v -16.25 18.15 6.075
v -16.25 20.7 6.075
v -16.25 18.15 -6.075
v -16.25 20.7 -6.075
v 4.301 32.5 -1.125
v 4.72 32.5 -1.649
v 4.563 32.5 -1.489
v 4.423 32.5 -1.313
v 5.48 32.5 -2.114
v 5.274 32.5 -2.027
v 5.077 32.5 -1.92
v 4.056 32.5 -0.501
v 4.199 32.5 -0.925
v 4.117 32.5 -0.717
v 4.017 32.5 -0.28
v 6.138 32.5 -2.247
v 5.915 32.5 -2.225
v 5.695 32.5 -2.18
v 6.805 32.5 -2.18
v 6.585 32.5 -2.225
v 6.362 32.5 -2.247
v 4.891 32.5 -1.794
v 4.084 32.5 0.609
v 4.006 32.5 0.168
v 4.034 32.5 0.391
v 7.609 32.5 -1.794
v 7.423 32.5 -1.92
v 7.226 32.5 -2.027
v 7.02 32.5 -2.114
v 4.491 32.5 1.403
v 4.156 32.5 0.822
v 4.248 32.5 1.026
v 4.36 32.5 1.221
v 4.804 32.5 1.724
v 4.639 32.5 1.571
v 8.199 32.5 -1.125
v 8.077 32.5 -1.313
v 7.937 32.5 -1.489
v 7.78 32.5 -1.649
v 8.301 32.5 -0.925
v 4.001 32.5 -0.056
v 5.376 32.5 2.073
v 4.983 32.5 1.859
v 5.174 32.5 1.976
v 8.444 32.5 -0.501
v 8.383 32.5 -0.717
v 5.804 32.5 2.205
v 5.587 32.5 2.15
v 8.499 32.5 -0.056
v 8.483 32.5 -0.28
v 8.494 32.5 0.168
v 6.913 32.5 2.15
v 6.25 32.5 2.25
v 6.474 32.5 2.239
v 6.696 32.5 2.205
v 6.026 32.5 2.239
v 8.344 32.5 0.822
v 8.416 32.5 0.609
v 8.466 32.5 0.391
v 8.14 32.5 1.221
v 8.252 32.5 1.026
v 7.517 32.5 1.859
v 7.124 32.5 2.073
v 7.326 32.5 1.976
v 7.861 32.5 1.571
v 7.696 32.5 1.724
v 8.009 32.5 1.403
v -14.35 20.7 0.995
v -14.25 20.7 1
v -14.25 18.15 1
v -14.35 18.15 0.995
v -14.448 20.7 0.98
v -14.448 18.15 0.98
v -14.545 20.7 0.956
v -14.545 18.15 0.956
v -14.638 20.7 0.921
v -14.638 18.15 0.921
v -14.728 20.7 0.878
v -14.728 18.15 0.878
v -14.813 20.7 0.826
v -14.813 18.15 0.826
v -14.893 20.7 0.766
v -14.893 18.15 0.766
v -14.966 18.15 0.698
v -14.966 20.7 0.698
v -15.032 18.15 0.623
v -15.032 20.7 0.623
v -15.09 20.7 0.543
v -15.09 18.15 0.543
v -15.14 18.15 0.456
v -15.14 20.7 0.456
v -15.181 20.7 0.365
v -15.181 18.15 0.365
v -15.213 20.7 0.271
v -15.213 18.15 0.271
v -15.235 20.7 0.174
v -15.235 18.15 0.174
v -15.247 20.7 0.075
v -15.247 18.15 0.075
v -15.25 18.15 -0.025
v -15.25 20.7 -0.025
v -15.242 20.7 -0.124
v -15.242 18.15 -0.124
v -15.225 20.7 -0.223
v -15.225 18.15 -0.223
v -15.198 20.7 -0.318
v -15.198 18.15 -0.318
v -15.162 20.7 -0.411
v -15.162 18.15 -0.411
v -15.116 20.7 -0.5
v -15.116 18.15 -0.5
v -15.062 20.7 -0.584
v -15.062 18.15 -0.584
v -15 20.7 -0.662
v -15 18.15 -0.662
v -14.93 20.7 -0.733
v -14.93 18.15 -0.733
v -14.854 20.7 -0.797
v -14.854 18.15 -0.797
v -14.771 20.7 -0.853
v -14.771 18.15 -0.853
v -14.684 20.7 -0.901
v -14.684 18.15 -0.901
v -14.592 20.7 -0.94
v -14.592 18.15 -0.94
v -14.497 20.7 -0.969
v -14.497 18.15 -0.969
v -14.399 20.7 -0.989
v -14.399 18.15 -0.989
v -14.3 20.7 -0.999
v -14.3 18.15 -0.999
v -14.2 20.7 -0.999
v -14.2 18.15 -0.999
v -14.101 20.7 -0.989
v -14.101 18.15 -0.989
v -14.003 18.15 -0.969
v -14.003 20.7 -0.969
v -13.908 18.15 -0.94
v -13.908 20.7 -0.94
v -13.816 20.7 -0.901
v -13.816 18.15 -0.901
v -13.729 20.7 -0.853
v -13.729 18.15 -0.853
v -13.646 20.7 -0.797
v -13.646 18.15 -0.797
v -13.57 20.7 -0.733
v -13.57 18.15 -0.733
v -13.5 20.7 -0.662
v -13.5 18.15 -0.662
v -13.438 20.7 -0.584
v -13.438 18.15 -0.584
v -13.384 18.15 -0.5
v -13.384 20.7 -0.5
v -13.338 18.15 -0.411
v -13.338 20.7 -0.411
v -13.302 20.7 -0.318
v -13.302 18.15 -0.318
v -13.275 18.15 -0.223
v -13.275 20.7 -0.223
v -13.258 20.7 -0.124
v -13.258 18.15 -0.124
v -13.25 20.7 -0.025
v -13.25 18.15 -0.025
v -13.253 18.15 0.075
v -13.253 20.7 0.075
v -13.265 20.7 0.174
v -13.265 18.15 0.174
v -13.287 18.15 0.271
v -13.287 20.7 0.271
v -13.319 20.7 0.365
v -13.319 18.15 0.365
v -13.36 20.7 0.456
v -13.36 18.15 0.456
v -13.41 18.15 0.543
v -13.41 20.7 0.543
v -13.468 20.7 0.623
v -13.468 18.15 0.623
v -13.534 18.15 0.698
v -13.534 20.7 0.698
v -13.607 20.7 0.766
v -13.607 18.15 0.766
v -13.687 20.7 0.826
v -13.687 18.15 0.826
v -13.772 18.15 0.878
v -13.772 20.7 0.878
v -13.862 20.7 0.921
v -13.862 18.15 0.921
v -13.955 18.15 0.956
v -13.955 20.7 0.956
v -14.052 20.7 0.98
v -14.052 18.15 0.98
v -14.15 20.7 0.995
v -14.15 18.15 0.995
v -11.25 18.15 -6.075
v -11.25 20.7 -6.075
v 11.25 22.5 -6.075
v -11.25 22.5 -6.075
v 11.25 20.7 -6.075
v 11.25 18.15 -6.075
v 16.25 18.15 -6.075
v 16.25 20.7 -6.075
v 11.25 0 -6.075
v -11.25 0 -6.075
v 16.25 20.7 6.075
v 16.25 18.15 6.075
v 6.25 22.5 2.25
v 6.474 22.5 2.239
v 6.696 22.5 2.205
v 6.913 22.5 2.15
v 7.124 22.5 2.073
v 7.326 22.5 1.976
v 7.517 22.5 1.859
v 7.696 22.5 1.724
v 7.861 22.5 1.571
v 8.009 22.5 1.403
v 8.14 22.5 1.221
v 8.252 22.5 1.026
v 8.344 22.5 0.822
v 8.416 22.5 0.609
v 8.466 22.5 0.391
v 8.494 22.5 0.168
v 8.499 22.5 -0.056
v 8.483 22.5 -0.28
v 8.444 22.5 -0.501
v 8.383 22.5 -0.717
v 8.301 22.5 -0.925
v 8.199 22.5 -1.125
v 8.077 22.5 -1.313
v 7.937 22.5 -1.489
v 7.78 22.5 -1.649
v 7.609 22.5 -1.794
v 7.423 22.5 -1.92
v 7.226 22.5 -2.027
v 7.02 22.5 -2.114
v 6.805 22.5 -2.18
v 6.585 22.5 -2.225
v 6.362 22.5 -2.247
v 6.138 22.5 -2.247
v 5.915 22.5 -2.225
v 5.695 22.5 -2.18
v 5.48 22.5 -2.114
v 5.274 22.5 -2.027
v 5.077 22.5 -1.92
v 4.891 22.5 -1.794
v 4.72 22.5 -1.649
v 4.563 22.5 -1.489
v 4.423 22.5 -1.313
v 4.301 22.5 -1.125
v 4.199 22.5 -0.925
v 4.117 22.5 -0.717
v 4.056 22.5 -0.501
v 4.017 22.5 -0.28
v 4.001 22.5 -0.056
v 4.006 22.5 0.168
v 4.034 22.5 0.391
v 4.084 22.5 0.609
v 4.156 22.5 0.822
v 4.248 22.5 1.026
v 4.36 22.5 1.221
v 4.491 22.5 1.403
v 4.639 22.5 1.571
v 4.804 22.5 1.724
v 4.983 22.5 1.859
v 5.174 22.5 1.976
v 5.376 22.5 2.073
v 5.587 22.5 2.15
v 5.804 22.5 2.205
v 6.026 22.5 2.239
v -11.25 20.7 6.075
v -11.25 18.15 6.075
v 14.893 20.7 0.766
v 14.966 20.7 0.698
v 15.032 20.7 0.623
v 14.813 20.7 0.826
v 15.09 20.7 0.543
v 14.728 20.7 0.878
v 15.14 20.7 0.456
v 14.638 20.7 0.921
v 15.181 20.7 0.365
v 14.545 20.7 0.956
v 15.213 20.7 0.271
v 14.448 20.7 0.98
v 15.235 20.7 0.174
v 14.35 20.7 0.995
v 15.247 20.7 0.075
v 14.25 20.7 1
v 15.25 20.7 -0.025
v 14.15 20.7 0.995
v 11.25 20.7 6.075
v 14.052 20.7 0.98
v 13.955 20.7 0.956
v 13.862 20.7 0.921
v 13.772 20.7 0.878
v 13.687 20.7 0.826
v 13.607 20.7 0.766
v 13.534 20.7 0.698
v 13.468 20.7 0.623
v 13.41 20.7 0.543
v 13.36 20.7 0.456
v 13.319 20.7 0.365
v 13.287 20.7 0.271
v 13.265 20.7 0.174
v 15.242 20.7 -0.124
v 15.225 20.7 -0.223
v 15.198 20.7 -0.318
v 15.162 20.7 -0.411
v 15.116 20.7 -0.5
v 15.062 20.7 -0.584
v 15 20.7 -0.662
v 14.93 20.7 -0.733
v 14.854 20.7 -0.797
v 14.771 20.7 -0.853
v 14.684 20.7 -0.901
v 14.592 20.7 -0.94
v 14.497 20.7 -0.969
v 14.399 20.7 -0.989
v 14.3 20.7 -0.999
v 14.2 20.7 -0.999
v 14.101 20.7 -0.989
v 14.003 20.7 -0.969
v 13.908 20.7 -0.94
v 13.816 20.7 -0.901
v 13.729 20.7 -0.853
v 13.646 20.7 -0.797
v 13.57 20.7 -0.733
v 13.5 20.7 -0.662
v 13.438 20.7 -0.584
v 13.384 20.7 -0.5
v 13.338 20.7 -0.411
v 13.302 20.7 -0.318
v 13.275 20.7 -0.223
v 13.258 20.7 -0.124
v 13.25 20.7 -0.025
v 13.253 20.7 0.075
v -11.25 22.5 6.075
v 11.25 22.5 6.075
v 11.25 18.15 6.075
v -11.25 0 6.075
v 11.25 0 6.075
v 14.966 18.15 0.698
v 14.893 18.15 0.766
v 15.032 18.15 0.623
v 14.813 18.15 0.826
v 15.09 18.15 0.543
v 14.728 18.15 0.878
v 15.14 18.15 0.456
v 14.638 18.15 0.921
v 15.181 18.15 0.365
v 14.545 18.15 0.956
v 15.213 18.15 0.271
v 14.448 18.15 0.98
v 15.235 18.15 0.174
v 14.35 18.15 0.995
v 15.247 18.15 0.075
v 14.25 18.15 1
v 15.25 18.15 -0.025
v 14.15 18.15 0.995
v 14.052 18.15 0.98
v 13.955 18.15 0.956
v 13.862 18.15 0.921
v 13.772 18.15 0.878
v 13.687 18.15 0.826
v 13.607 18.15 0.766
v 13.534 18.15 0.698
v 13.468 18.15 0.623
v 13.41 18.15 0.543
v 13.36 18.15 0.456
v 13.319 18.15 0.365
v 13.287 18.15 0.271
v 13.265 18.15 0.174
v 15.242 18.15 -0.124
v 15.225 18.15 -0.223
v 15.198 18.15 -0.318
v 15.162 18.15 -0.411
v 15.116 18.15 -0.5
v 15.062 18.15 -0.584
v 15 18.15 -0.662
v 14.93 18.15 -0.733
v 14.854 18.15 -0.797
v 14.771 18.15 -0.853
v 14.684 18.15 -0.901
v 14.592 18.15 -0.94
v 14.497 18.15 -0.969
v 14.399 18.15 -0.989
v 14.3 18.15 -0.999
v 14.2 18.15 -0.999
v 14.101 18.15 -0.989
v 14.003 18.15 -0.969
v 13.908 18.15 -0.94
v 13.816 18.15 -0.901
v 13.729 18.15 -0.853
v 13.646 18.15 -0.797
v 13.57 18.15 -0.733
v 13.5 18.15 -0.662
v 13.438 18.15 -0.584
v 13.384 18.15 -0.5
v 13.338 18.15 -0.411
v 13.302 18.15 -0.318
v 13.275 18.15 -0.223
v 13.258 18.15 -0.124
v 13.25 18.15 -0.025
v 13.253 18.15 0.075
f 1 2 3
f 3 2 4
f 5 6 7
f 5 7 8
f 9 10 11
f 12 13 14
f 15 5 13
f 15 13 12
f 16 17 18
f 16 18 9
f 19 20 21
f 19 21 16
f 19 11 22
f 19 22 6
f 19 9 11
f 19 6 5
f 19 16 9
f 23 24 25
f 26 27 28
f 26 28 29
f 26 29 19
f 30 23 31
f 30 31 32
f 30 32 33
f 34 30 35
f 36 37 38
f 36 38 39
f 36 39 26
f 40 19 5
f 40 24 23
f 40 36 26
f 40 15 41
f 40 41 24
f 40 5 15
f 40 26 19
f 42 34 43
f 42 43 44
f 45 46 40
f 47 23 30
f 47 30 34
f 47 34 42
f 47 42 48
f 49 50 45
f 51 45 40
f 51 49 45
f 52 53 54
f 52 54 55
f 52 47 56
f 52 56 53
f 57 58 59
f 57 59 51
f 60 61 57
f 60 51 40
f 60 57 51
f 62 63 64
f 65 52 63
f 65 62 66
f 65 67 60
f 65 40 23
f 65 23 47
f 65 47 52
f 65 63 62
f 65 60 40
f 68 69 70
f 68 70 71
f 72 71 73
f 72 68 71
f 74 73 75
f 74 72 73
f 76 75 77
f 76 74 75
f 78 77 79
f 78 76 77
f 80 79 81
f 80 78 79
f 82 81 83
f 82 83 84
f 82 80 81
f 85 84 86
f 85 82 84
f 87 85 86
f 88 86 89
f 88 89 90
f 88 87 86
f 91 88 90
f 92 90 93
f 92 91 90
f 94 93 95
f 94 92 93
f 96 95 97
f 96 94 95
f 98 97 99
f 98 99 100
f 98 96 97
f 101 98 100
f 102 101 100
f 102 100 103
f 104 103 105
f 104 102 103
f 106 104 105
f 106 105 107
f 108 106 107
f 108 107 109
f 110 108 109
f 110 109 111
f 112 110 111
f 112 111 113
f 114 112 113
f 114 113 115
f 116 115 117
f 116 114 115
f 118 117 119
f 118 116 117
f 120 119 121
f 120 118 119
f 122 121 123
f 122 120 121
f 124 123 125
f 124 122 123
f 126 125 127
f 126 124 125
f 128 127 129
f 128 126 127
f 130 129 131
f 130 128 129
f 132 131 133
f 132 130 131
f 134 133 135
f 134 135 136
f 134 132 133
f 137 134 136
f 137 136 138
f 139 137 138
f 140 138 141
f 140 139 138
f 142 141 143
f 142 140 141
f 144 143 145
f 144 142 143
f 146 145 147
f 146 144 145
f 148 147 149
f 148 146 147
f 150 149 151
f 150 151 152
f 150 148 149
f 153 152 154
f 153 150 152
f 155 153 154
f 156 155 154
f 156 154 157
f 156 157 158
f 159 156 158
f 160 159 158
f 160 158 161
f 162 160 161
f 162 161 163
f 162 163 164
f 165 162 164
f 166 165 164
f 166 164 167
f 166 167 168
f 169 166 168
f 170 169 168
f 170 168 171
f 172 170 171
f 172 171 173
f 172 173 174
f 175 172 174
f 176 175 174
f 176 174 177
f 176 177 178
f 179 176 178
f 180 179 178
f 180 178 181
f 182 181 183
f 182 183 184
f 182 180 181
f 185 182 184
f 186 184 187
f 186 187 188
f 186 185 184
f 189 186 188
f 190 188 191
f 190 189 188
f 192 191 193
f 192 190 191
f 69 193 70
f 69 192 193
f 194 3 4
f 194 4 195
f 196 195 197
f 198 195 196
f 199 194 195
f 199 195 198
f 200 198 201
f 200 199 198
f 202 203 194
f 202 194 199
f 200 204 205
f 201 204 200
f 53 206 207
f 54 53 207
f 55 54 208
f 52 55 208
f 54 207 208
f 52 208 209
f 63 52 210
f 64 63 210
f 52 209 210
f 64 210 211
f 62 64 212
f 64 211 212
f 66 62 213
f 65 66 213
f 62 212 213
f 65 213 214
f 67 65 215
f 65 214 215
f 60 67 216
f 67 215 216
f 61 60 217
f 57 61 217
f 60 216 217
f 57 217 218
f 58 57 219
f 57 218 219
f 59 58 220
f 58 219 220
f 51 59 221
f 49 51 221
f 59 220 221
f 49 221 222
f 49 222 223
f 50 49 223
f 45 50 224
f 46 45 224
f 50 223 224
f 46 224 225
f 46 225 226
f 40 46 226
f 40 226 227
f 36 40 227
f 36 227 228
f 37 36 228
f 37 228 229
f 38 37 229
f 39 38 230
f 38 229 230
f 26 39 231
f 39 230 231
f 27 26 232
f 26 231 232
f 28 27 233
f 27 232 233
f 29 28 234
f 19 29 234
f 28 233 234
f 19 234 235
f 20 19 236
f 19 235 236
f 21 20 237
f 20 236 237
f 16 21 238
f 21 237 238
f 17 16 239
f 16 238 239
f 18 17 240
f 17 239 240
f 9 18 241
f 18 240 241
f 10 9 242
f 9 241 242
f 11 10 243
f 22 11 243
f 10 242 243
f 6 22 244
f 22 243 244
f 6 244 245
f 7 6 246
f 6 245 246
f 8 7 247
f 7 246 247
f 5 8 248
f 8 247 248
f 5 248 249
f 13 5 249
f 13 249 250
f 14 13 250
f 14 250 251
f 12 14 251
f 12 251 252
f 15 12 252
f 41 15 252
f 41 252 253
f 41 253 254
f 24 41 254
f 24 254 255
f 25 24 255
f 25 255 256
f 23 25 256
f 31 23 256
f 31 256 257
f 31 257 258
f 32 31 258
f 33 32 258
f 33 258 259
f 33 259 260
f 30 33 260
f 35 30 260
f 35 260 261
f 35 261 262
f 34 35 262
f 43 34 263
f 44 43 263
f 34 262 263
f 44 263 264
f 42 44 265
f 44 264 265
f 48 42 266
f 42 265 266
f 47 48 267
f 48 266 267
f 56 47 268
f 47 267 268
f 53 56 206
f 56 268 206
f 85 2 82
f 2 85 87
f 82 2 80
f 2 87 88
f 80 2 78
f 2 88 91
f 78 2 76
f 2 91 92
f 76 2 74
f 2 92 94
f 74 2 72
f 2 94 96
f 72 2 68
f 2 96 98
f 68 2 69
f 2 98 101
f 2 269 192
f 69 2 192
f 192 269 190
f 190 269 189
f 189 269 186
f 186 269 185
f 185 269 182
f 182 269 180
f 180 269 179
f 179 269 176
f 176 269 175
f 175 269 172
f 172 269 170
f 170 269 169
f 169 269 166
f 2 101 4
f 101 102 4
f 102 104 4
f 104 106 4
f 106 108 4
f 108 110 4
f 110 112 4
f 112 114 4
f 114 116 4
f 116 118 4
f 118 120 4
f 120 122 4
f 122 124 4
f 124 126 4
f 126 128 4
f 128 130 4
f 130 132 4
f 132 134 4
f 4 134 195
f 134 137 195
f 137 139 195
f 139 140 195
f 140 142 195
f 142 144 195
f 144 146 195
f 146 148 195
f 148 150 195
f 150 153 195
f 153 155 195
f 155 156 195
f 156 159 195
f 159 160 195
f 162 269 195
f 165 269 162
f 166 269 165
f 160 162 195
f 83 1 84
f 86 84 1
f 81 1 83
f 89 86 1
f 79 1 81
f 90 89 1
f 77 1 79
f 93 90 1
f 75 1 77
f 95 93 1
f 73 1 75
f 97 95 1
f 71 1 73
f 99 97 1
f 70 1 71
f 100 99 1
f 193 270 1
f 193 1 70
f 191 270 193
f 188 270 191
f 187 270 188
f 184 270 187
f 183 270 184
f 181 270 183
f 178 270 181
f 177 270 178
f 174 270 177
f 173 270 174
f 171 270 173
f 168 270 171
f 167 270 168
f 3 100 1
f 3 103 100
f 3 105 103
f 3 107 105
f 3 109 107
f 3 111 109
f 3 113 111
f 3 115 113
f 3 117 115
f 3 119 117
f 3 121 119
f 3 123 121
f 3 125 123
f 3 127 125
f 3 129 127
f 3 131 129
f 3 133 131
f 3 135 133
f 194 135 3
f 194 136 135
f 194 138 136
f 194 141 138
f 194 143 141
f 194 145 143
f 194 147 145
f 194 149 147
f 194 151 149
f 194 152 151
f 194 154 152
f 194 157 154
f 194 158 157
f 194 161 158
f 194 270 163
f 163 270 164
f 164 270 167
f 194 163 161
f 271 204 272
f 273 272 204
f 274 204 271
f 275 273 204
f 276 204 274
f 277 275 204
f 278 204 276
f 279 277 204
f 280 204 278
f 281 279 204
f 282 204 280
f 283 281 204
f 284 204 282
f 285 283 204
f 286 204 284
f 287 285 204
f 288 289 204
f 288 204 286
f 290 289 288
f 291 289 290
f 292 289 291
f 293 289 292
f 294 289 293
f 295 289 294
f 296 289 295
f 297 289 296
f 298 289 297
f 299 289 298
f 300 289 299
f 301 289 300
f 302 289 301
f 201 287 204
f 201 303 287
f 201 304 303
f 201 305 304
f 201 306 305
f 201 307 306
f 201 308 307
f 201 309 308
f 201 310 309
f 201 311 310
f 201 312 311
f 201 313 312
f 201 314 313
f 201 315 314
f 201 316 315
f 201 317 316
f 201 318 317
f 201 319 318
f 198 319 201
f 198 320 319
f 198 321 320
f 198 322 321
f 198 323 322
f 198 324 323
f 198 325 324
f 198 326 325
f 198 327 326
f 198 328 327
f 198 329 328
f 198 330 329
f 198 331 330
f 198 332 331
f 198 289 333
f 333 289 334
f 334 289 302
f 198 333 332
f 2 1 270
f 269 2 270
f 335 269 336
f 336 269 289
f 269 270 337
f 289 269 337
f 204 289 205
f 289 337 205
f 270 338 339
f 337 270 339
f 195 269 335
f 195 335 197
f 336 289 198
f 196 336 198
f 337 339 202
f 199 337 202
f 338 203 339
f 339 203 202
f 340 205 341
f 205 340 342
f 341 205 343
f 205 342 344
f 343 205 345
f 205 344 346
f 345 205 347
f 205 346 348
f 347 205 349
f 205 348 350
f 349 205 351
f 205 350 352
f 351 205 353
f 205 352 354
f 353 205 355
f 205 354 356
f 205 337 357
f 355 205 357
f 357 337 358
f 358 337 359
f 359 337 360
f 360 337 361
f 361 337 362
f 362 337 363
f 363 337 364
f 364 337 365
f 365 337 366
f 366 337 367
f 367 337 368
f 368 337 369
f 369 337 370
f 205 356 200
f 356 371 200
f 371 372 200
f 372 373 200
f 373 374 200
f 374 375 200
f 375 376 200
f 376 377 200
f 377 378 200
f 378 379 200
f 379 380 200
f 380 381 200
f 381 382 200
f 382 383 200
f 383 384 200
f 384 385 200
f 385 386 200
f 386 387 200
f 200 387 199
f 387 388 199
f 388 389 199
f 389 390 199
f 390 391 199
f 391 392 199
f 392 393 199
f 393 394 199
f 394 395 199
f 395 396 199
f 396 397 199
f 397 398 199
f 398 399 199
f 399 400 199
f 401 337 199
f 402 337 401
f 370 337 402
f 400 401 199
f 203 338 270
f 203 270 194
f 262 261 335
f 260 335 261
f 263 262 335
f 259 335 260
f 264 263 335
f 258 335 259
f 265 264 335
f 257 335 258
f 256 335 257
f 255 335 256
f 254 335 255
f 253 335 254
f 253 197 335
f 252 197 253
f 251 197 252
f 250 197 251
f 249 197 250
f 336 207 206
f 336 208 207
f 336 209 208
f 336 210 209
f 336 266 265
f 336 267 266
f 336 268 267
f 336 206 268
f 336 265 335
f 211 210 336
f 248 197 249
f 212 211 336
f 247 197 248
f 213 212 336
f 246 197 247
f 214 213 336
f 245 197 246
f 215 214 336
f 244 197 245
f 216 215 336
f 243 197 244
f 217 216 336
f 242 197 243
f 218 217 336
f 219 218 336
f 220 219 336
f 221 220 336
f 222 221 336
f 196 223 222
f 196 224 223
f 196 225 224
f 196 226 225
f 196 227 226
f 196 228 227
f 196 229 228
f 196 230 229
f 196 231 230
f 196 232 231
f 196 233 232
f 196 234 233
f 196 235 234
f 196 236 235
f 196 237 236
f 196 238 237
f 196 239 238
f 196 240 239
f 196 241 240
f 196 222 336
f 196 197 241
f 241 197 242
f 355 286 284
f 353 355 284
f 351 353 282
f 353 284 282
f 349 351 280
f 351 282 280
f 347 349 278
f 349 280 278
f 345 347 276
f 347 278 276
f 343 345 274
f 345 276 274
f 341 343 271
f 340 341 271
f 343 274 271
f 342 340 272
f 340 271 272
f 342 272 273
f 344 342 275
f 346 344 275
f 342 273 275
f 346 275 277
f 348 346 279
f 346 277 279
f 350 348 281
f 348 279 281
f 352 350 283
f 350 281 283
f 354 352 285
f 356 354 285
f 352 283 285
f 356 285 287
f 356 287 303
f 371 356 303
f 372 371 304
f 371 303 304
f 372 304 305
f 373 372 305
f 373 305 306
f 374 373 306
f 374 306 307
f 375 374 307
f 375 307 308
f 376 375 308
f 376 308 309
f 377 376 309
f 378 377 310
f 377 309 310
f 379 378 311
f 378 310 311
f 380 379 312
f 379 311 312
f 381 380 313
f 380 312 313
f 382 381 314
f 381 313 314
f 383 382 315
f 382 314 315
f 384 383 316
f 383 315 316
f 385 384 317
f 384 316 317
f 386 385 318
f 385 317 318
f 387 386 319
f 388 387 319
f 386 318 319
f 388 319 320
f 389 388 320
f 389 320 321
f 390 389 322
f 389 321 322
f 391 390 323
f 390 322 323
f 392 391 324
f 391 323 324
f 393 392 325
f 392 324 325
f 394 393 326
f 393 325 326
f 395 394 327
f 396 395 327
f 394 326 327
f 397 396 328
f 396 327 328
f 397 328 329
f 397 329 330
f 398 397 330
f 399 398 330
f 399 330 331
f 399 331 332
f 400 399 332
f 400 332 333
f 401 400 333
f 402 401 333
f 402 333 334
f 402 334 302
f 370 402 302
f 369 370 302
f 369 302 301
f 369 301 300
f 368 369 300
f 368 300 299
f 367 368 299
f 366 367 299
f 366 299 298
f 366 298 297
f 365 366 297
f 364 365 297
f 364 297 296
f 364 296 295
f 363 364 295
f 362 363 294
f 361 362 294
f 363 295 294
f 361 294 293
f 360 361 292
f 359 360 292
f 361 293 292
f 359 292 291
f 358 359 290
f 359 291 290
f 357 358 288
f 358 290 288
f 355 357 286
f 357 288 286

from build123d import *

# Parameters (mm, degrees)
SKETCH1_W           = 22.5
SKETCH1_H           = 12.15
BOSS_EXTRUDE1_DEPTH = 22.5
SKETCH2_W           = 12.15
SKETCH2_H           = 2.55
BOSS_EXTRUDE2_DEPTH = 5
SKETCH3_R           = 1
CUT_EXTRUDE1_DEPTH  = 2.55
SKETCH4_R           = 2.25
BOSS_EXTRUDE3_DEPTH = 10


with BuildPart() as part:
    # Sketch1 → Boss-Extrude1 (new body)
    with BuildSketch(Plane(origin=(0, 0, 0), x_dir=(1, 0, 0), z_dir=(0, 1, 0))):
        Rectangle(SKETCH1_W, SKETCH1_H)
    extrude(amount=BOSS_EXTRUDE1_DEPTH)

    # Sketch2 → Boss-Extrude2 (add)
    with BuildSketch(Plane(origin=(11.25, 0, 0), x_dir=(0, 0, -1), z_dir=(1, 0, 0))):
        with Locations((0, 19.425)):
            Rectangle(SKETCH2_W, SKETCH2_H)
    boss_extrude2 = extrude(amount=BOSS_EXTRUDE2_DEPTH)

    # Sketch3 → Cut-Extrude1 (cut)
    with BuildSketch(Plane(origin=(0, 20.7, 0), x_dir=(1, 0, 0), z_dir=(0, 1, 0))):
        with Locations(Location((14.25, 0, 0), (0, 0, 270))):
            Circle(SKETCH3_R)
    cut_extrude1 = extrude(amount=-CUT_EXTRUDE1_DEPTH, mode=Mode.SUBTRACT)

    # Mirror1: Boss-Extrude2, Cut-Extrude1 across plane
    add(boss_extrude2.mirror(Plane(origin=(0, 0, 0), x_dir=(0, 0, 1), z_dir=(1, 0, 0))))
    add(cut_extrude1.mirror(Plane(origin=(0, 0, 0), x_dir=(0, 0, 1), z_dir=(1, 0, 0))), mode=Mode.SUBTRACT)

    # Sketch4 → Boss-Extrude3 (add)
    with BuildSketch(Plane(origin=(0, 22.5, 0), x_dir=(1, 0, 0), z_dir=(0, 1, 0))):
        with Locations(Location((6.25, 0, 0), (0, 0, 270))):
            Circle(SKETCH4_R)
    extrude(amount=BOSS_EXTRUDE3_DEPTH)


solid = part.part
